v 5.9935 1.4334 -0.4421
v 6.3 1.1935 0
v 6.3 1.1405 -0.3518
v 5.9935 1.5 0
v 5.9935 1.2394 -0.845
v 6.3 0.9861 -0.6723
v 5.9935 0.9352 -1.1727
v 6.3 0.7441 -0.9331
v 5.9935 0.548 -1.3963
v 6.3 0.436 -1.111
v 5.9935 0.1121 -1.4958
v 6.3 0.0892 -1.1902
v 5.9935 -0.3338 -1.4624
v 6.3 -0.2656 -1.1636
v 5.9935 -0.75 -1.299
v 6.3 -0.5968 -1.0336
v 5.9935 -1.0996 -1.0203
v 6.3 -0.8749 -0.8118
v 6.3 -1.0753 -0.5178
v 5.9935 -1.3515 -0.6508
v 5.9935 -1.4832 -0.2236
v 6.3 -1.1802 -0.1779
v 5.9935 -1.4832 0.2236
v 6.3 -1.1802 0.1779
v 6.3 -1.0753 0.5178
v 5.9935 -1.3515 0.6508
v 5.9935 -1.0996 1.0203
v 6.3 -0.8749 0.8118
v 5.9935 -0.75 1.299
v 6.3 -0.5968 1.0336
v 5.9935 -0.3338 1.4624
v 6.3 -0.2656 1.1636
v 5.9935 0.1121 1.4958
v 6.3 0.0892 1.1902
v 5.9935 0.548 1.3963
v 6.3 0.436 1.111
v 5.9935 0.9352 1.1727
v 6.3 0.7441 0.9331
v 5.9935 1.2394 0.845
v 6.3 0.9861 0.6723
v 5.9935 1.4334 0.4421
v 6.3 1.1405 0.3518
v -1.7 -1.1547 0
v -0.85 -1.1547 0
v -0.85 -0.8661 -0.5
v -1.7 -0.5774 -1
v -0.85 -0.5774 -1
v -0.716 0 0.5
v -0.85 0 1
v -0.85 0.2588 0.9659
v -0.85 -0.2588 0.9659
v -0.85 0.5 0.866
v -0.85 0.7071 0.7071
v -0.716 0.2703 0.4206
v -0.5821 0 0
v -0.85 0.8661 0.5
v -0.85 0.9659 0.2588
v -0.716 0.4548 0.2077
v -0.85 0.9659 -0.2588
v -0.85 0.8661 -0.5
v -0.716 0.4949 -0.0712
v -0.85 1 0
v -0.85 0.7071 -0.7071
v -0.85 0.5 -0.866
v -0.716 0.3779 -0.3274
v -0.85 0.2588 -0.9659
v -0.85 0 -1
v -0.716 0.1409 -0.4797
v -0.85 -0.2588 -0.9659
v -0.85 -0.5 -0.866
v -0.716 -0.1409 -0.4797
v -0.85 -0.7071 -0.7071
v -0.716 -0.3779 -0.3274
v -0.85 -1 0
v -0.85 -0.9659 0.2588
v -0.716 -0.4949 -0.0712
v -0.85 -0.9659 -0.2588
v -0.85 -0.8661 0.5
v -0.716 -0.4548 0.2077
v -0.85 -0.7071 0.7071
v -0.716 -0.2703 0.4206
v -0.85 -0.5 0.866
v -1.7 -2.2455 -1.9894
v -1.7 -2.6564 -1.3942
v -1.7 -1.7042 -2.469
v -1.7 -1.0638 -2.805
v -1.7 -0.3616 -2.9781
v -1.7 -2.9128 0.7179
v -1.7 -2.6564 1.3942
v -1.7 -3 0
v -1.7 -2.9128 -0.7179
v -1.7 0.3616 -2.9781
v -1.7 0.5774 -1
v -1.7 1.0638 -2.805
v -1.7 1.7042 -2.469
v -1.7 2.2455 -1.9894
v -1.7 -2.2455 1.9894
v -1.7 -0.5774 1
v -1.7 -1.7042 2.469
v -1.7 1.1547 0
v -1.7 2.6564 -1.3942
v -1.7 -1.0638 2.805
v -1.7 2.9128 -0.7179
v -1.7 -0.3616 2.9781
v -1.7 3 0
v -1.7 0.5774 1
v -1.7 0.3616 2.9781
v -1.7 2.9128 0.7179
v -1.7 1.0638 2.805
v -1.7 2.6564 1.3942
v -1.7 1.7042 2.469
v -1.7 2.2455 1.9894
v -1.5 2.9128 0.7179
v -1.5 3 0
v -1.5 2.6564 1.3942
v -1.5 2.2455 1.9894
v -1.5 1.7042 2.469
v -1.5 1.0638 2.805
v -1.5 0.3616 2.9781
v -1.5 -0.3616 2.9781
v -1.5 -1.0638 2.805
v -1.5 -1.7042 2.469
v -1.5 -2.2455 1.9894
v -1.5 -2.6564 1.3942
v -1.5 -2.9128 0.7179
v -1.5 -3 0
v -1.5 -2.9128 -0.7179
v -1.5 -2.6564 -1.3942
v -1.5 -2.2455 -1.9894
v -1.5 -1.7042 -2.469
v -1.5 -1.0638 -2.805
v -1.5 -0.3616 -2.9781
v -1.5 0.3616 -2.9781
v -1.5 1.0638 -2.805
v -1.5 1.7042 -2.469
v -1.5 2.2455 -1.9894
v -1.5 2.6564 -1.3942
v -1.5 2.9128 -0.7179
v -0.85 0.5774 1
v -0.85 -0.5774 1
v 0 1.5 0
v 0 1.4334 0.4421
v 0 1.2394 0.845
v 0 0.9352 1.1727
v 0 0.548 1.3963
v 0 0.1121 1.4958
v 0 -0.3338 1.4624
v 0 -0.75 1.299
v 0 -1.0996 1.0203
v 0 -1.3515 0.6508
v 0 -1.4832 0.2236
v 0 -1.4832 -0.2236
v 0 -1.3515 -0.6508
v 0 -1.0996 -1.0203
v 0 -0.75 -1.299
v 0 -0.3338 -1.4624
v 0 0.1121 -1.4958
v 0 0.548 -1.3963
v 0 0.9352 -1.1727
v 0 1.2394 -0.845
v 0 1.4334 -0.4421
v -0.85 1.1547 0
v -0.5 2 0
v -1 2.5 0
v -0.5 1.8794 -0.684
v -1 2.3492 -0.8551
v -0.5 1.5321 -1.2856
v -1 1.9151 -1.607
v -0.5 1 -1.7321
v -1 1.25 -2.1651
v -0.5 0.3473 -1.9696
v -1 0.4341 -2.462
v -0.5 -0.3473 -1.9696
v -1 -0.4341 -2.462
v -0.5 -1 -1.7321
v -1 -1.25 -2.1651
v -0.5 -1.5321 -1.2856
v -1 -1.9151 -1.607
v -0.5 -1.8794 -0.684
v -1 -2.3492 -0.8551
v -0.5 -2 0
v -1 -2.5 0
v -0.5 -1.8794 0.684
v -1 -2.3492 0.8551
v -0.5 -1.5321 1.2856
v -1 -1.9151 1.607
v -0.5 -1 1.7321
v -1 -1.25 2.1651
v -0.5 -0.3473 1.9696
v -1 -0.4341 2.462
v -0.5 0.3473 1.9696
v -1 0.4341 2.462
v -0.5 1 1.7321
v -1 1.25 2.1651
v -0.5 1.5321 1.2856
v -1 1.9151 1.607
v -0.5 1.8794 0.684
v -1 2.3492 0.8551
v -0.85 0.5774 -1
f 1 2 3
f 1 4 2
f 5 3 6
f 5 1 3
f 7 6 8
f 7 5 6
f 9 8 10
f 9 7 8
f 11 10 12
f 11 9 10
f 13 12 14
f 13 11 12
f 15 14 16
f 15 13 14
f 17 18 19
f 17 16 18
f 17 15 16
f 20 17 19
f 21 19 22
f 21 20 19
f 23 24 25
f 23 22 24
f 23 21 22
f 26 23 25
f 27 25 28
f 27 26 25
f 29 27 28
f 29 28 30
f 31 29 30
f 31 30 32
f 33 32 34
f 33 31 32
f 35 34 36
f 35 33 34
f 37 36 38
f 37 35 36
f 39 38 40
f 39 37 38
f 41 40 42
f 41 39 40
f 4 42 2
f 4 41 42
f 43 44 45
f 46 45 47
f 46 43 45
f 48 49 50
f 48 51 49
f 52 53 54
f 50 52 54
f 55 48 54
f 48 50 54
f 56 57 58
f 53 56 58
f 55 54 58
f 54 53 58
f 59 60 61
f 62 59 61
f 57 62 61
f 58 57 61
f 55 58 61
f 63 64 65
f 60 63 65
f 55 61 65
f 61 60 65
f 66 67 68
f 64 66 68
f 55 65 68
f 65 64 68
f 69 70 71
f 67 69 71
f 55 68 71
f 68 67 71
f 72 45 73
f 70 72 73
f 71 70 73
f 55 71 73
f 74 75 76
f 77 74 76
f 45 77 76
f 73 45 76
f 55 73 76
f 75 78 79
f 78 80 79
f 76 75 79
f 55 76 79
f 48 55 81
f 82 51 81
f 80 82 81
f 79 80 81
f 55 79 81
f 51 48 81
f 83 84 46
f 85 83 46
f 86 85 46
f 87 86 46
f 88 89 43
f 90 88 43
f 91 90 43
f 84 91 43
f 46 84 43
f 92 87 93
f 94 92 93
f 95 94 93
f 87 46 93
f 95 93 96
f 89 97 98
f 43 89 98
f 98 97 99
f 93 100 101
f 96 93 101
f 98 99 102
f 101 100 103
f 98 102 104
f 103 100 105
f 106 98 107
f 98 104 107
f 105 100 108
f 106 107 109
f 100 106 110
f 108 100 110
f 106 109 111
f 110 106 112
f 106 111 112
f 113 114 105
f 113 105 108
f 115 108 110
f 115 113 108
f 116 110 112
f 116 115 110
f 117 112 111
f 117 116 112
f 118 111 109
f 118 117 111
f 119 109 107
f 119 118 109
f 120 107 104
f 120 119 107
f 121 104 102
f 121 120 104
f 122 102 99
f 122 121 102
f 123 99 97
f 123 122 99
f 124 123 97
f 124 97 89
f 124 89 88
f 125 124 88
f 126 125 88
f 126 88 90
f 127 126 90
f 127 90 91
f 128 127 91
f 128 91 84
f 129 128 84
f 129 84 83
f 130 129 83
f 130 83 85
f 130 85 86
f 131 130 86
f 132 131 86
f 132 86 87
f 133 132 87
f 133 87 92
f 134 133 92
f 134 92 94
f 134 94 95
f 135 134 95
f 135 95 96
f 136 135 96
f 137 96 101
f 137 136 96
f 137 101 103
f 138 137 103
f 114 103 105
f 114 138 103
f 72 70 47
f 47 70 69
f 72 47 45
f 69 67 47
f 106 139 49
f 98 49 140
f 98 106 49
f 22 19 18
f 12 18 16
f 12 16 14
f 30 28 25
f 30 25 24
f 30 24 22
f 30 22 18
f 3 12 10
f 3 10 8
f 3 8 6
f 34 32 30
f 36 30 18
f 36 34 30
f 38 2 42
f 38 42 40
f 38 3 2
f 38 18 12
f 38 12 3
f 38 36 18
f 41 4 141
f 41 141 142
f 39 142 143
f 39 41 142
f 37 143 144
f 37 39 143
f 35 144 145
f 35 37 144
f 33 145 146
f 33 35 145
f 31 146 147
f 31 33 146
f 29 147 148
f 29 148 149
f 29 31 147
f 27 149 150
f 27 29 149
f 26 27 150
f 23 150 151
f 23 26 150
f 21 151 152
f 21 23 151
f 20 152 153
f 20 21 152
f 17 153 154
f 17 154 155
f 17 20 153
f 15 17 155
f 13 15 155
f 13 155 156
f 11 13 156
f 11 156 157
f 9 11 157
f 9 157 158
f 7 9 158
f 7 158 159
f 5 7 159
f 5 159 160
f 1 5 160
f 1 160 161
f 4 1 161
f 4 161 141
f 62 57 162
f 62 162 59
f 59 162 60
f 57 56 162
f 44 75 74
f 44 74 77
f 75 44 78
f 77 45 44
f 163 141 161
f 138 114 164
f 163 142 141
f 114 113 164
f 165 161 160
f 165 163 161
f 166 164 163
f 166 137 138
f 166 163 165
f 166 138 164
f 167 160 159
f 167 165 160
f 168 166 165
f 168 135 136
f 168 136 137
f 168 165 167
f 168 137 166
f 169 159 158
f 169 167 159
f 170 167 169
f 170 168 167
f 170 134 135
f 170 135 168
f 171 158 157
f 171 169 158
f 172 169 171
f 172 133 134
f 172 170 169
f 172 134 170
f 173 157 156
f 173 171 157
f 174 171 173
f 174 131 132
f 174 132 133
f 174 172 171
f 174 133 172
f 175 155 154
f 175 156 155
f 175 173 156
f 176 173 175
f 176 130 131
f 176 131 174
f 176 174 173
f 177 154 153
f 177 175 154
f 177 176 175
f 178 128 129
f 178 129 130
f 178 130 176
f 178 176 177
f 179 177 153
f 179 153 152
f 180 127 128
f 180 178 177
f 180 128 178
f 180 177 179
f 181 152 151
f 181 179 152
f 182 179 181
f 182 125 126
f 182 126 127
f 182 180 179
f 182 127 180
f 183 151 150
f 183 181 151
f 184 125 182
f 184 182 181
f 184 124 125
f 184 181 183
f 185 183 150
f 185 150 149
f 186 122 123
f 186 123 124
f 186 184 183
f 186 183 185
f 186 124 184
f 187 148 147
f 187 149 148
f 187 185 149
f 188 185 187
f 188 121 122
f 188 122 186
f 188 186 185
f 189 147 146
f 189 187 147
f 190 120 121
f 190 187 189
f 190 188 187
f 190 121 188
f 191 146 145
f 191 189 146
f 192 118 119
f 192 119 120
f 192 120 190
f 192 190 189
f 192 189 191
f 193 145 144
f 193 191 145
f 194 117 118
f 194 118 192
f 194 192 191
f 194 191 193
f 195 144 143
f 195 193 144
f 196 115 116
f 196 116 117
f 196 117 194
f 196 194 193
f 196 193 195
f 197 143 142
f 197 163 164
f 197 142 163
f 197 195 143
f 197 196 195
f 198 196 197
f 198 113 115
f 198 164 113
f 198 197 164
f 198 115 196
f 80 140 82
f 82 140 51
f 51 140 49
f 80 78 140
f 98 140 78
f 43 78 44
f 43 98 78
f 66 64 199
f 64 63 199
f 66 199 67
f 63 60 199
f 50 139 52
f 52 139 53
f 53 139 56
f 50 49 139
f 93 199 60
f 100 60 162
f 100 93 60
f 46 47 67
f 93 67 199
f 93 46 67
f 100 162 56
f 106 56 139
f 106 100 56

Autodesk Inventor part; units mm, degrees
sketch "Sketch_1" plane through (0, 0, 0) normal (0, 0, 1) x (1, 0, 0)
  line L0 (6.3, 0) -> (0, 0)
  line L1 (-1.7, 0) -> (-1.7, 3)
  line L2 (-1.7, 3) -> (-1.5, 3)
  line L3 (-1.5, 3) -> (0, 1.5)
  line L4 (0, 1.5) -> (5.9935, 1.5)
  line L5 (5.9935, 1.5) -> (6.3, 1.1935)
  line L6 (6.3, 1.1935) -> (6.3, 0)
  line L7 (6.3, 0) -> (-1.7, 0)
revolve "Revolution1" add sketch "Sketch_1" angle 360 about axis through (6.3, 0, 0) along (1, 0, 0)
thread "Thread1" size "M3x0.5" class "6g" standard "ISO Metric profile" length 5.4935
sketch "Sketch2" plane through (-1.7, 0, 0) normal (-1, 0, 0) x (0, 0, 1)
  point P0 (0, 0)
hole "Hole1" at (-1.7, 0, 0) direction (1, 0, 0) diameter 2 depth 0.85 tip angle 150
sketch "Sketch_3" plane through (-1.7, 0, 0) normal (1, 0, 0) x (0, 0, -1)
  line L0 (-1, -0.5774) -> (0, -1.1547)
  line L1 (0, -1.1547) -> (1, -0.5774)
  line L2 (1, -0.5774) -> (1, 0.5774)
  line L3 (1, 0.5774) -> (0, 1.1547)
  line L4 (0, 1.1547) -> (-1, 0.5774)
  line L5 (-1, 0.5774) -> (-1, -0.5774)
extrude "Extrusion1" cut sketch "Sketch_3" along normal blind 0.85
ref_plane "bolt_to_nut_XY" through (6.3, 0, 0) normal (1, 0, 0) x (0, 0, -1)
ref_plane "bolt_to_nut_YZ" through (6.3, 0, 0) normal (0, 0, -1) x (0, 1, 0)
ref_plane "bolt_to_nut_ZX" through (6.3, 0, 0) normal (0, 1, 0) x (1, 0, 0)
ref_plane "dummy_to_bolt_XY" through (0, 0, 0) normal (1, 0, 0) x (0, 0, -1)
ref_plane "dummy_to_bolt_YZ" through (0, 0, 0) normal (0, 0, -1) x (0, 1, 0)
ref_plane "dummy_to_bolt_ZX" through (0, 0, 0) normal (0, 1, 0) x (1, 0, 0)
properties part number "HFBCM3-8"
